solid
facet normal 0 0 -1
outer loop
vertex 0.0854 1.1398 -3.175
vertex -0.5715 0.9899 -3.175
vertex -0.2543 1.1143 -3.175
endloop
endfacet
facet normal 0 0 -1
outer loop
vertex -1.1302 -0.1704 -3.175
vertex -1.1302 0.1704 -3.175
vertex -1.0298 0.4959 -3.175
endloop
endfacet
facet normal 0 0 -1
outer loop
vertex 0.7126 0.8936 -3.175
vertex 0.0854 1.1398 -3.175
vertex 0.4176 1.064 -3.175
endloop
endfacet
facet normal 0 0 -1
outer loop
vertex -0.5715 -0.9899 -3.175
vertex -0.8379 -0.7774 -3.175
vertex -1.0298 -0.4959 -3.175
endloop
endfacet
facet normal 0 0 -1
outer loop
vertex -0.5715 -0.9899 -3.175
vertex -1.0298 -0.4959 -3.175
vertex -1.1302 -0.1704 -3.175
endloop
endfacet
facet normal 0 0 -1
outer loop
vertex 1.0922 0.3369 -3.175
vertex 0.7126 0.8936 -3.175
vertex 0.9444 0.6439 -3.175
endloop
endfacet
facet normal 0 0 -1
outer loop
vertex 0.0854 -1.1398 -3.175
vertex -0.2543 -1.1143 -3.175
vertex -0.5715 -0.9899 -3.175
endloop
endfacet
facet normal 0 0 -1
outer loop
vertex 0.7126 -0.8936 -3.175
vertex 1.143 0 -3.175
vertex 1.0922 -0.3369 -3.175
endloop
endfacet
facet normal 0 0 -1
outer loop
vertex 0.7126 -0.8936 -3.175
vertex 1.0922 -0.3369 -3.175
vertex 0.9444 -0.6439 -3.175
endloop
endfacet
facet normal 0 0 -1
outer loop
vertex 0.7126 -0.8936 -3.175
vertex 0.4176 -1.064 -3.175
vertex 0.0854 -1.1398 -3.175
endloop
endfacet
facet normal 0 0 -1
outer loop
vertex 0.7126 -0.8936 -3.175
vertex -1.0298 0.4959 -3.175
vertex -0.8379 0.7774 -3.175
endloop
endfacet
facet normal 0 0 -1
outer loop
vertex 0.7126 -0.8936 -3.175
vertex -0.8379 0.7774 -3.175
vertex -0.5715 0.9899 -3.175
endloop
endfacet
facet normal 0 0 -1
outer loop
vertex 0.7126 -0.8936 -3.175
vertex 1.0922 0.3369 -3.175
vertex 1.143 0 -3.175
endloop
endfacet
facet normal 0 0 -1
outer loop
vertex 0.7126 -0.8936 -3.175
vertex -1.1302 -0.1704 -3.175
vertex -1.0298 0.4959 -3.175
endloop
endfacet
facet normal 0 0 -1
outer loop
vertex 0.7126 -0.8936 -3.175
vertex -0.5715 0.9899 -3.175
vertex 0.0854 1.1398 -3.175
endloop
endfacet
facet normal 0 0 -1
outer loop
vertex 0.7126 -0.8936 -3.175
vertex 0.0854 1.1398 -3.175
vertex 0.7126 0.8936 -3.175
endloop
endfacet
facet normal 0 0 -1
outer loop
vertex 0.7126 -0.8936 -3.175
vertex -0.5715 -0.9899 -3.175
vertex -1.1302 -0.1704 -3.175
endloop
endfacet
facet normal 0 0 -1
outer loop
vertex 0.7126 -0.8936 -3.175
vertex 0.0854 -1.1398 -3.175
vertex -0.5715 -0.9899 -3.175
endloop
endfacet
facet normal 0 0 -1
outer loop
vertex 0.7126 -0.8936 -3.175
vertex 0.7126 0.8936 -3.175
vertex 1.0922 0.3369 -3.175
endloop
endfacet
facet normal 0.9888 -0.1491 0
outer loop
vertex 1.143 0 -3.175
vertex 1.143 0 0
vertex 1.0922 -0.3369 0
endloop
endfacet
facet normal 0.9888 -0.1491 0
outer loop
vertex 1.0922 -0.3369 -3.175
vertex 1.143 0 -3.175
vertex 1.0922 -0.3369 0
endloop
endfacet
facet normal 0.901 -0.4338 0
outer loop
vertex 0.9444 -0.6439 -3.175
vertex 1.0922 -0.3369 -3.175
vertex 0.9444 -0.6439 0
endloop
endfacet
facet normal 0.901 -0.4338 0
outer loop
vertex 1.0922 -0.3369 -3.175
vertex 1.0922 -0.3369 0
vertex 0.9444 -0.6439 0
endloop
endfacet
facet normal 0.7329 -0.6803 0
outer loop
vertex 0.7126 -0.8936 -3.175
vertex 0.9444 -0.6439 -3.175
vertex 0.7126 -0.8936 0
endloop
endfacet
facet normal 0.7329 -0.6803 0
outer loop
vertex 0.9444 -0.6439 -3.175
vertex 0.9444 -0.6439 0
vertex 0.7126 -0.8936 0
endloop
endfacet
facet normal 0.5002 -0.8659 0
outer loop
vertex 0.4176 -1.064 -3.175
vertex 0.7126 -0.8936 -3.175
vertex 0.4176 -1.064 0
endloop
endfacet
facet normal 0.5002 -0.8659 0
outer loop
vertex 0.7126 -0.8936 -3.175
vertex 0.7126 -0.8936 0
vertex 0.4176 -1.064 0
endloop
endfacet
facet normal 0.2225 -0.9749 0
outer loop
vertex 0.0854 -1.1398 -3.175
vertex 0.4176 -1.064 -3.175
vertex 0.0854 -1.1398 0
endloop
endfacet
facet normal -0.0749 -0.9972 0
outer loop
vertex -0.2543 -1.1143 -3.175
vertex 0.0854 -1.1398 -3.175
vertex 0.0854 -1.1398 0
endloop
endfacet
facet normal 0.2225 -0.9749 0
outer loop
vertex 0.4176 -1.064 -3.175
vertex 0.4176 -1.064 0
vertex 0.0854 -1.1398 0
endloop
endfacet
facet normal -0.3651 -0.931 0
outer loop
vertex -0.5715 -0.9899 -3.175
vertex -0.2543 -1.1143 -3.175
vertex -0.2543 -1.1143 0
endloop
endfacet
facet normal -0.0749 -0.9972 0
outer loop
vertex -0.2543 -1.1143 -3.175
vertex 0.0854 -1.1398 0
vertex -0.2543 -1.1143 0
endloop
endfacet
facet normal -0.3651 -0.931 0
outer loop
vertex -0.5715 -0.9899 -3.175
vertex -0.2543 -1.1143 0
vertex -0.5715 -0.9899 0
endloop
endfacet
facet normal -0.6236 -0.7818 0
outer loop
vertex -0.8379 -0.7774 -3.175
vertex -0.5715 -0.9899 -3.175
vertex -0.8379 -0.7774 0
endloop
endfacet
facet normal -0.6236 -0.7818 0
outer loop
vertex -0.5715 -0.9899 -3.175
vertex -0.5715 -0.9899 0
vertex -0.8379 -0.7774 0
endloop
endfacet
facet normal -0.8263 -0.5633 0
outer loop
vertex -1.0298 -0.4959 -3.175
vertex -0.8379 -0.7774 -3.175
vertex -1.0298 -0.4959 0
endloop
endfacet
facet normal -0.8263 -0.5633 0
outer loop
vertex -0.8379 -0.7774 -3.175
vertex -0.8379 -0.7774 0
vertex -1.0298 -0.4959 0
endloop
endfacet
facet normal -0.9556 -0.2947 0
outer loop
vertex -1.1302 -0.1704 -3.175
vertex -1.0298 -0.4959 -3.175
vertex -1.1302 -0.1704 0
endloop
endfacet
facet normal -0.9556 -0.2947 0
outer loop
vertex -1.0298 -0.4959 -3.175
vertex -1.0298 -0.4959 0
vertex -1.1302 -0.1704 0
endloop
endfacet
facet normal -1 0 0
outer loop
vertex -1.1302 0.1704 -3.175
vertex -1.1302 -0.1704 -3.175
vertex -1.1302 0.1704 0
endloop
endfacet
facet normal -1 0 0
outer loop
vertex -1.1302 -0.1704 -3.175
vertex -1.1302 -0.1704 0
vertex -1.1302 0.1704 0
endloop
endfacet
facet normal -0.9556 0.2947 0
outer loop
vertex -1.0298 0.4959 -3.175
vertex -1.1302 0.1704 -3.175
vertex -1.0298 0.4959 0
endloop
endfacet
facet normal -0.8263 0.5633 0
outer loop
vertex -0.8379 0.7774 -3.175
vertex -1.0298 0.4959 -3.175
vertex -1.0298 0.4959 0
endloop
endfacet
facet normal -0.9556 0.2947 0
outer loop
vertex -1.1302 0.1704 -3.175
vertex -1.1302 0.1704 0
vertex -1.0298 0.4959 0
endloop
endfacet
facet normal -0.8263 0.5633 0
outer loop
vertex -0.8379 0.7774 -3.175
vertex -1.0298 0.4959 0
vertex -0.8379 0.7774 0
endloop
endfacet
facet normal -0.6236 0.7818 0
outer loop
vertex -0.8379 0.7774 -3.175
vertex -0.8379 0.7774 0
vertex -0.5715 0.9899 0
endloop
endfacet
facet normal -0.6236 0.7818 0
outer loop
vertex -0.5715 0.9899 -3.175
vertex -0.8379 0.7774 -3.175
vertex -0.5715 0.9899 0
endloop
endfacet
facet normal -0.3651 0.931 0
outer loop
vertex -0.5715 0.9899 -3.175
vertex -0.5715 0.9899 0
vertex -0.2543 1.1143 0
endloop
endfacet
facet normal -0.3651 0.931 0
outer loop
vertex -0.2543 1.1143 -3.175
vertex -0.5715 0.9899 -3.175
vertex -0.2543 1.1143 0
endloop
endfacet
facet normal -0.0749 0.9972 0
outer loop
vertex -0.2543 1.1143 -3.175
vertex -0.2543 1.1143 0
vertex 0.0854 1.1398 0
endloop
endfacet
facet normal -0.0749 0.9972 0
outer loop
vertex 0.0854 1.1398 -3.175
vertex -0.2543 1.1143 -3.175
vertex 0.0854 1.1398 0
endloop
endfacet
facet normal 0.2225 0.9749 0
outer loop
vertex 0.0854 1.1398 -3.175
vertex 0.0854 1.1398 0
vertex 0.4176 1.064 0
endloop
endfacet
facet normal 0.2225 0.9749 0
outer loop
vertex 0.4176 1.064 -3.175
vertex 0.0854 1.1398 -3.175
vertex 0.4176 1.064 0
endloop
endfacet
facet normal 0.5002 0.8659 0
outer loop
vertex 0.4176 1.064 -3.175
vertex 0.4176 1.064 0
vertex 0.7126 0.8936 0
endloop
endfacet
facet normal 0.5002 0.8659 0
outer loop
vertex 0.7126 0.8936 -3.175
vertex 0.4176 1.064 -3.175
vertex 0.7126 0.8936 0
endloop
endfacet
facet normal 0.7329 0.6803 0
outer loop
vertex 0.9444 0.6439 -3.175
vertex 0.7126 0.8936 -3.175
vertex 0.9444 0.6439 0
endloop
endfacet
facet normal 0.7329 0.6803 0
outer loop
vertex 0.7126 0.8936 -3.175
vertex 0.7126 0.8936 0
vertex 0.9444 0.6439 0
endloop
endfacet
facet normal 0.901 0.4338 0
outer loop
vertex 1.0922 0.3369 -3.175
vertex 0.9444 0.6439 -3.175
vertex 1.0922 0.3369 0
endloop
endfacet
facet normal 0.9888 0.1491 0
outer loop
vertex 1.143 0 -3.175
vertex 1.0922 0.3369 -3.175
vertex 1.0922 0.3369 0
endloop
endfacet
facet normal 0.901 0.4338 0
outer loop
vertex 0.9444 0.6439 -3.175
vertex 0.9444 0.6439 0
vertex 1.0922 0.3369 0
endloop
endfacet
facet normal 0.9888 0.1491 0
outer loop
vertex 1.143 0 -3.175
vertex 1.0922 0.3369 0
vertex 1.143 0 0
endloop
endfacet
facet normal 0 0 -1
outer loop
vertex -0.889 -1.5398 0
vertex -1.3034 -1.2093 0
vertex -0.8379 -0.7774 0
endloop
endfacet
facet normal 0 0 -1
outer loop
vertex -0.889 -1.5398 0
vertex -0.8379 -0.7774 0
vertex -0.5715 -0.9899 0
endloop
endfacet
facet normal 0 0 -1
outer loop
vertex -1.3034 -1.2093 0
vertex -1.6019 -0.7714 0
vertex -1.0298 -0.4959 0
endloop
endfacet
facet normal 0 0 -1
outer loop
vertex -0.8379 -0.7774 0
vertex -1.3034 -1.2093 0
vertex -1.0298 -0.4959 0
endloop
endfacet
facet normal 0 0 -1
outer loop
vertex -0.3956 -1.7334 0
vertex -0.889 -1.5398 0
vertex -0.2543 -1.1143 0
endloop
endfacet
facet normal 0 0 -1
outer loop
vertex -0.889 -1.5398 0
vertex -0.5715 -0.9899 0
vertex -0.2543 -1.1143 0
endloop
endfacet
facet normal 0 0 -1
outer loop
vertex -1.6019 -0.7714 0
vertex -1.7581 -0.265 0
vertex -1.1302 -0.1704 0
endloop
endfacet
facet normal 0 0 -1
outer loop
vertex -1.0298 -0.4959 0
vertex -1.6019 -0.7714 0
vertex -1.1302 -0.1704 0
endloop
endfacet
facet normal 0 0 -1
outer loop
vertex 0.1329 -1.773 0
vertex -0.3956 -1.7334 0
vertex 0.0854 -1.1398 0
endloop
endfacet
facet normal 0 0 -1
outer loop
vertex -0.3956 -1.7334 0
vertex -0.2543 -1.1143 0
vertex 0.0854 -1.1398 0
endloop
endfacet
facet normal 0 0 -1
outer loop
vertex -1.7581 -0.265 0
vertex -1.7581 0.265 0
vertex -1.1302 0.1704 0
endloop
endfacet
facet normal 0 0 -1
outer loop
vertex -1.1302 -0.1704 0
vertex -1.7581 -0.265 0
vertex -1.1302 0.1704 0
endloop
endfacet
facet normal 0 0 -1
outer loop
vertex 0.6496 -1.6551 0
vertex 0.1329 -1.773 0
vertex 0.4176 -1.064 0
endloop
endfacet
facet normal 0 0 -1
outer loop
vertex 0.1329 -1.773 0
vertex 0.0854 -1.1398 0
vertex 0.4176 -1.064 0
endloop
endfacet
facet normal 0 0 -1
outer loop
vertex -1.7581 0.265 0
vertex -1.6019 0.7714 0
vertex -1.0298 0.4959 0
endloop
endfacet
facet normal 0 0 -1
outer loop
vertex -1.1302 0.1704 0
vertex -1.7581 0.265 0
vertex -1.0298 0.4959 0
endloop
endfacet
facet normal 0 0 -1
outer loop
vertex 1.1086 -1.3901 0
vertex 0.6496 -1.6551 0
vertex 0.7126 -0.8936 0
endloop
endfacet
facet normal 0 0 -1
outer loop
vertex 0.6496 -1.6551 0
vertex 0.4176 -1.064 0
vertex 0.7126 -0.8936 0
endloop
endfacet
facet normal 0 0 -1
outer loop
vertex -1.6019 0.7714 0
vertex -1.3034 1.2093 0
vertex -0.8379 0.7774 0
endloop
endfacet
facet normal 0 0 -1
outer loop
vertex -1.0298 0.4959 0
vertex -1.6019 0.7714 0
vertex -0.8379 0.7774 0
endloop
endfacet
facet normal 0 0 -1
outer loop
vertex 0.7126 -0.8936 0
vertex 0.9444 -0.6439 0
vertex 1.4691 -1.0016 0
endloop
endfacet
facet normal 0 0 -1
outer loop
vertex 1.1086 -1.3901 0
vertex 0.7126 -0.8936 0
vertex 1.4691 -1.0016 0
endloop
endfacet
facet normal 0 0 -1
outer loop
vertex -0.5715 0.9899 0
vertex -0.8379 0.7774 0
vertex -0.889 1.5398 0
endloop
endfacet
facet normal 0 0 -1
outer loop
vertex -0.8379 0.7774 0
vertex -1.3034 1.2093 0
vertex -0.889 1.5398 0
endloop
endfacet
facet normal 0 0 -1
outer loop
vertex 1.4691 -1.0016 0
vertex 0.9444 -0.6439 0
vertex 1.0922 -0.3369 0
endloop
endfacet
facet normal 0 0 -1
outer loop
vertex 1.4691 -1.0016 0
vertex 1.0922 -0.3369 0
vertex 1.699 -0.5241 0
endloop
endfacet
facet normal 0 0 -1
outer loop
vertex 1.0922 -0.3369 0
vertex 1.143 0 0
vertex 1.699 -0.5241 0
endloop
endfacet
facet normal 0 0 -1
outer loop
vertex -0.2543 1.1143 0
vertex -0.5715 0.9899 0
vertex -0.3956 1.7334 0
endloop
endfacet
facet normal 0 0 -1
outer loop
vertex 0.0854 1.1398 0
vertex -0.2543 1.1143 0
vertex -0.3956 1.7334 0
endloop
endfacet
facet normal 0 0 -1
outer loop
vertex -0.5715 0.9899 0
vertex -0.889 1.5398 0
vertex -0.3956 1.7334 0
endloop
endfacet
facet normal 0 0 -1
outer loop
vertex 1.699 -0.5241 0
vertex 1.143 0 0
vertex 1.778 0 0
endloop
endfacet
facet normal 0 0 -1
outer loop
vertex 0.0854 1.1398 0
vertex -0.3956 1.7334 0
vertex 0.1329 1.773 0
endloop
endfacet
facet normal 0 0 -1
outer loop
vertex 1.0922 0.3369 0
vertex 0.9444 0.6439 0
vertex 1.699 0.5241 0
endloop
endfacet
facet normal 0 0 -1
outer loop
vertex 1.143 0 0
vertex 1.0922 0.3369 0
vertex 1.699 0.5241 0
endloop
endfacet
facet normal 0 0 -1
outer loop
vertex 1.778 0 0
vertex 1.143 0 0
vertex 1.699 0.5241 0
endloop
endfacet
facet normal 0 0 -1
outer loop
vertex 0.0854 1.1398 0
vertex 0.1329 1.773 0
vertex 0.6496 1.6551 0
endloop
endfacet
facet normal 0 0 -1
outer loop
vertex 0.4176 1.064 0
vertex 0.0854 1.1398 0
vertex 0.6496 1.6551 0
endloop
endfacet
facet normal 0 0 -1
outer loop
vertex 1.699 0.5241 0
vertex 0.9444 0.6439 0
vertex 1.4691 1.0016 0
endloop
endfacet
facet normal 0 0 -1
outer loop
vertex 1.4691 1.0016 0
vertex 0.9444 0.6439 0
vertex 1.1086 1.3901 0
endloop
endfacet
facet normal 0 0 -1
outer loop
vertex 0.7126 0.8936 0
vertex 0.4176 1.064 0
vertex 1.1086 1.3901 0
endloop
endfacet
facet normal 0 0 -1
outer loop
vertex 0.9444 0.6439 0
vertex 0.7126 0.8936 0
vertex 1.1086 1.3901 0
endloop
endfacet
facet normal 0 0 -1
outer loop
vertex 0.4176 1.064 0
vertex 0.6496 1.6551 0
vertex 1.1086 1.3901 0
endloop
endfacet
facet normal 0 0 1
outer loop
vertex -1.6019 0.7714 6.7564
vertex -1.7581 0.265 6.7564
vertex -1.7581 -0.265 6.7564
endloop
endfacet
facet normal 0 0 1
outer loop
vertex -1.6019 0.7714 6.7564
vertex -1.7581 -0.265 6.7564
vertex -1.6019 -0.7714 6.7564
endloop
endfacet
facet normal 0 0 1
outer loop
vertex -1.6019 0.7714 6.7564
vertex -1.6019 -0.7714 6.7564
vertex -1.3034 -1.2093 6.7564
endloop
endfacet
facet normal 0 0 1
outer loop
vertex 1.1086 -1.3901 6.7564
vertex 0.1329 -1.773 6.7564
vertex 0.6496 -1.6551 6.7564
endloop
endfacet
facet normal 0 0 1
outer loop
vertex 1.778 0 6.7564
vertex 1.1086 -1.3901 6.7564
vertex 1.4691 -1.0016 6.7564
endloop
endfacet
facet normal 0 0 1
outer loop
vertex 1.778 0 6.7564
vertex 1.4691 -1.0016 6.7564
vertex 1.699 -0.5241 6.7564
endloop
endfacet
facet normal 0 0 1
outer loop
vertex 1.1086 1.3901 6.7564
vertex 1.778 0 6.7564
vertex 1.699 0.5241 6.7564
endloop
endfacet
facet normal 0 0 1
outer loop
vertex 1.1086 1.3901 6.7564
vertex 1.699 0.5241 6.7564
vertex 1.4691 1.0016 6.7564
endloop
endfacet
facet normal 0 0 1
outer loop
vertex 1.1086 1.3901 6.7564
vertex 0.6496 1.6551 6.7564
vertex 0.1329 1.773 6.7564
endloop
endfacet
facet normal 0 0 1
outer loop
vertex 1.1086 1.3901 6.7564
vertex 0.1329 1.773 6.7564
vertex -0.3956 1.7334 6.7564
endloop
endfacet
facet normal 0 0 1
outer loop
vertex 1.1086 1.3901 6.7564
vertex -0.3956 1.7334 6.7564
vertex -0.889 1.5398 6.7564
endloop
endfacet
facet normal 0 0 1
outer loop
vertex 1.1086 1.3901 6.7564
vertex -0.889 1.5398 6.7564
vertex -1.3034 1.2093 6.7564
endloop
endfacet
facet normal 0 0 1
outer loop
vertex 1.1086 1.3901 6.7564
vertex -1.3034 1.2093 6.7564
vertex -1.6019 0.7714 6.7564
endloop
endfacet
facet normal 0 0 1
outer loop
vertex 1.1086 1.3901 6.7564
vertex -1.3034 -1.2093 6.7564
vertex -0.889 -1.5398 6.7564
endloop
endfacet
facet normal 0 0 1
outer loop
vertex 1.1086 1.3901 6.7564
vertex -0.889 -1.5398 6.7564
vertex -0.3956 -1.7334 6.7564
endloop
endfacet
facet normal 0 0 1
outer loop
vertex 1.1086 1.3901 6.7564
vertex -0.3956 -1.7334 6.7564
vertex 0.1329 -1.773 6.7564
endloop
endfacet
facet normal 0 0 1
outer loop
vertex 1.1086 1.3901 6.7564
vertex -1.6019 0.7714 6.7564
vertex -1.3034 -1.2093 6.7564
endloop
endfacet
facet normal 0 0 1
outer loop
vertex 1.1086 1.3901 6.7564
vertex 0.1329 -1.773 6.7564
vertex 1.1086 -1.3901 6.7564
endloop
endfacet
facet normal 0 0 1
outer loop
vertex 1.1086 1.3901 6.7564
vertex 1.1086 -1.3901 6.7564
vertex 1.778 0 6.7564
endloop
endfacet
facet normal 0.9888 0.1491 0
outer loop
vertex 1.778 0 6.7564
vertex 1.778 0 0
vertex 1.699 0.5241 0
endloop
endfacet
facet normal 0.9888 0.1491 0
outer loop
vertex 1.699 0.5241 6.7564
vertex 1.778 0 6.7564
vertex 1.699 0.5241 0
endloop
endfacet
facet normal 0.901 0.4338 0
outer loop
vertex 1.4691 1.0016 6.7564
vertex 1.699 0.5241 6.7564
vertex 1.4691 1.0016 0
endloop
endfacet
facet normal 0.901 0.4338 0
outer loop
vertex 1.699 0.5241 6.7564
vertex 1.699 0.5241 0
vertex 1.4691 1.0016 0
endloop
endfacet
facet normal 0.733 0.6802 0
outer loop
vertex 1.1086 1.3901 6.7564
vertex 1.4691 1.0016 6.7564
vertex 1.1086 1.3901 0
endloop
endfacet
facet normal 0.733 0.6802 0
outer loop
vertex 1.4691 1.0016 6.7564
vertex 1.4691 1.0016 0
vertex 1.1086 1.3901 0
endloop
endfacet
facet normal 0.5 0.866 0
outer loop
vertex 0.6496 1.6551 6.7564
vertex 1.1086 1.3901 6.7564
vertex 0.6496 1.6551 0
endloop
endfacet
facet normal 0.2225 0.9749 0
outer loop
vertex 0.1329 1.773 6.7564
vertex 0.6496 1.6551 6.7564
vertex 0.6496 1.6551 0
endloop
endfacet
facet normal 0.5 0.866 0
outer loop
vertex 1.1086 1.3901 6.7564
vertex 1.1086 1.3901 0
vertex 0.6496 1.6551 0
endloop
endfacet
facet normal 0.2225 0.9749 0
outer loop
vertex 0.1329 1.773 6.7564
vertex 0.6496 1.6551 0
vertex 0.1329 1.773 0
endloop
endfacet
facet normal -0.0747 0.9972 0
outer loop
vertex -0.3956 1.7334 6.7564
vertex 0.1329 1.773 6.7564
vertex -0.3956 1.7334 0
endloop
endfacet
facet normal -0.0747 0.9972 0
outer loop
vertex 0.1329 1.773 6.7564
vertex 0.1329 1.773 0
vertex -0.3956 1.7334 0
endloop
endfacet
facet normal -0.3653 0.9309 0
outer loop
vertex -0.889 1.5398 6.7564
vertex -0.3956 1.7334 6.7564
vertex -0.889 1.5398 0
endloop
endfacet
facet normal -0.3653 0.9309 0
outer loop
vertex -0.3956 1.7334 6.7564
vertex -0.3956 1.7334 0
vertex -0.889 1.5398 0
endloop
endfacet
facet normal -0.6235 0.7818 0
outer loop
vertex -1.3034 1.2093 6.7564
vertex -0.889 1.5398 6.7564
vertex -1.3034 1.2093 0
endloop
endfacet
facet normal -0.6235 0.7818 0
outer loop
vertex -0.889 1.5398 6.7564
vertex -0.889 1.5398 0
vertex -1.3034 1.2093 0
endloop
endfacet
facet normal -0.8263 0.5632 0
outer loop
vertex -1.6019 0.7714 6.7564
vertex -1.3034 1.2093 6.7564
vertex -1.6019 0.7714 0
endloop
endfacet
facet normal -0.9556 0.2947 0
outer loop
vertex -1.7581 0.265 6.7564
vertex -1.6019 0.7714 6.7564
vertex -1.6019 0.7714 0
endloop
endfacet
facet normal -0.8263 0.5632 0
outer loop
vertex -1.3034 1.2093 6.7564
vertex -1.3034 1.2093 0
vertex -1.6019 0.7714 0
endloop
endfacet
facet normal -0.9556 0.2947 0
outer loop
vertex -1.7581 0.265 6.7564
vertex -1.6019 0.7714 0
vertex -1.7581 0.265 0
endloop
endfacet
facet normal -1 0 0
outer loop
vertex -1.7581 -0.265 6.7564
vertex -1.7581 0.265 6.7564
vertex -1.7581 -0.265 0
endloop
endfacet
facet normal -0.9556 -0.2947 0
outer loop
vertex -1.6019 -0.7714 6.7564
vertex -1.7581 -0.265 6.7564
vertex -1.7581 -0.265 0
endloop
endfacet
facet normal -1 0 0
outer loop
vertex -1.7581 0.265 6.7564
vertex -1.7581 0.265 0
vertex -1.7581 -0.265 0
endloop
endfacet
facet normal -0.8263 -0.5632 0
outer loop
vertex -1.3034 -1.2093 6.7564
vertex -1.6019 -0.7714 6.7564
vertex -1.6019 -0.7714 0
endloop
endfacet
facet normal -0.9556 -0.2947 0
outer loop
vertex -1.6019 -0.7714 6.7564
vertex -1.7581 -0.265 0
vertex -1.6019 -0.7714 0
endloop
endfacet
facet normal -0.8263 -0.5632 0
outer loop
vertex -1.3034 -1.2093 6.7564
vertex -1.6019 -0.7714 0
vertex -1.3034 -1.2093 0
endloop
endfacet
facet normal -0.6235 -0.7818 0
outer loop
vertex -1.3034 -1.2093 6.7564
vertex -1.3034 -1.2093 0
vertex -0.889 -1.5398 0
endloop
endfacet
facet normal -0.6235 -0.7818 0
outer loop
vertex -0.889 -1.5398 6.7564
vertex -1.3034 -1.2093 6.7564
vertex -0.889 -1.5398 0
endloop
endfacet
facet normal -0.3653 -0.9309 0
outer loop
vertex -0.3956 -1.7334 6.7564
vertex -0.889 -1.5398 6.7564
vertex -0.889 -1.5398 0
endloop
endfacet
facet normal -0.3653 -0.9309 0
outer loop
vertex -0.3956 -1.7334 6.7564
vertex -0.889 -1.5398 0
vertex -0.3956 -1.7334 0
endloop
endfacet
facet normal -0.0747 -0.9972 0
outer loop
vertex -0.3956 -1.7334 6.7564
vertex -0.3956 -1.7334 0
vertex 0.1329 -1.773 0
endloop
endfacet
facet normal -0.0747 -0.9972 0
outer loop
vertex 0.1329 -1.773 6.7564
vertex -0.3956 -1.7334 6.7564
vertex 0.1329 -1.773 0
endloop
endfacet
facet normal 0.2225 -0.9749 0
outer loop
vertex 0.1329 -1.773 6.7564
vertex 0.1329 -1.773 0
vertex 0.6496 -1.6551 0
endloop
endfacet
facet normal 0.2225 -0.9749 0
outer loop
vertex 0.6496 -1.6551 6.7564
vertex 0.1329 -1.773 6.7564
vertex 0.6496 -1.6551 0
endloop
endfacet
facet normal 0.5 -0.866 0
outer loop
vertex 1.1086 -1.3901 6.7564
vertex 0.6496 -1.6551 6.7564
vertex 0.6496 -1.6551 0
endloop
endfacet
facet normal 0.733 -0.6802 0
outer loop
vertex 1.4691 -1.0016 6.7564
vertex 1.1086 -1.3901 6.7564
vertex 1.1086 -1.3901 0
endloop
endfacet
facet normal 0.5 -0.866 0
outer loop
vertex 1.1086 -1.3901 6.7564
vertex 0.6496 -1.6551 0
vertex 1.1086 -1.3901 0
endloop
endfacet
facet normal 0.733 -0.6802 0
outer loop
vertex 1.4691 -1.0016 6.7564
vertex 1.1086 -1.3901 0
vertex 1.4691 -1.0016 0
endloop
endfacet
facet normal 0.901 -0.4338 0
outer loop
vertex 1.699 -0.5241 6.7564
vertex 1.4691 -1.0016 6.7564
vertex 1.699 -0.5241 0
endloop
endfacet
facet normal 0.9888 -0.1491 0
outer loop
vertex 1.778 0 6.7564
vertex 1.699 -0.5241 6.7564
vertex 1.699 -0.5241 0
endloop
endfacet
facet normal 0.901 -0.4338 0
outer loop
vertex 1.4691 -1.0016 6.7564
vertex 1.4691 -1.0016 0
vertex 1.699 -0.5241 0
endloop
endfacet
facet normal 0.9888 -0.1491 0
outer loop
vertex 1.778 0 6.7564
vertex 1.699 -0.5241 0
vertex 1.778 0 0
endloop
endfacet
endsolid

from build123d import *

# Parameters (mm, degrees)
F0_R     = 1.778
F1_DEPTH = 6.7564
F3_R     = 1.1684
F4_DEPTH = 3.175
F5_R     = 1.143
F6_DEPTH = 3.175


with BuildPart() as f1:
    # F0 (on Top) → F1 (new body)
    with BuildSketch(Plane.XY):
        Circle(F0_R)
    extrude(amount=F1_DEPTH)

    # F3 (on face) → F4 (cut)
    with BuildSketch(Plane.XY.offset(6.7564)):
        Circle(F3_R)
    extrude(amount=F4_DEPTH, mode=Mode.SUBTRACT)

    # F5 (on face) → F6 (join)
    with BuildSketch(Plane(origin=(0, 0, 0), x_dir=(1, 0, 0), z_dir=(0, 0, -1))):
        Circle(F5_R)
    extrude(amount=F6_DEPTH)


solid = f1.part
